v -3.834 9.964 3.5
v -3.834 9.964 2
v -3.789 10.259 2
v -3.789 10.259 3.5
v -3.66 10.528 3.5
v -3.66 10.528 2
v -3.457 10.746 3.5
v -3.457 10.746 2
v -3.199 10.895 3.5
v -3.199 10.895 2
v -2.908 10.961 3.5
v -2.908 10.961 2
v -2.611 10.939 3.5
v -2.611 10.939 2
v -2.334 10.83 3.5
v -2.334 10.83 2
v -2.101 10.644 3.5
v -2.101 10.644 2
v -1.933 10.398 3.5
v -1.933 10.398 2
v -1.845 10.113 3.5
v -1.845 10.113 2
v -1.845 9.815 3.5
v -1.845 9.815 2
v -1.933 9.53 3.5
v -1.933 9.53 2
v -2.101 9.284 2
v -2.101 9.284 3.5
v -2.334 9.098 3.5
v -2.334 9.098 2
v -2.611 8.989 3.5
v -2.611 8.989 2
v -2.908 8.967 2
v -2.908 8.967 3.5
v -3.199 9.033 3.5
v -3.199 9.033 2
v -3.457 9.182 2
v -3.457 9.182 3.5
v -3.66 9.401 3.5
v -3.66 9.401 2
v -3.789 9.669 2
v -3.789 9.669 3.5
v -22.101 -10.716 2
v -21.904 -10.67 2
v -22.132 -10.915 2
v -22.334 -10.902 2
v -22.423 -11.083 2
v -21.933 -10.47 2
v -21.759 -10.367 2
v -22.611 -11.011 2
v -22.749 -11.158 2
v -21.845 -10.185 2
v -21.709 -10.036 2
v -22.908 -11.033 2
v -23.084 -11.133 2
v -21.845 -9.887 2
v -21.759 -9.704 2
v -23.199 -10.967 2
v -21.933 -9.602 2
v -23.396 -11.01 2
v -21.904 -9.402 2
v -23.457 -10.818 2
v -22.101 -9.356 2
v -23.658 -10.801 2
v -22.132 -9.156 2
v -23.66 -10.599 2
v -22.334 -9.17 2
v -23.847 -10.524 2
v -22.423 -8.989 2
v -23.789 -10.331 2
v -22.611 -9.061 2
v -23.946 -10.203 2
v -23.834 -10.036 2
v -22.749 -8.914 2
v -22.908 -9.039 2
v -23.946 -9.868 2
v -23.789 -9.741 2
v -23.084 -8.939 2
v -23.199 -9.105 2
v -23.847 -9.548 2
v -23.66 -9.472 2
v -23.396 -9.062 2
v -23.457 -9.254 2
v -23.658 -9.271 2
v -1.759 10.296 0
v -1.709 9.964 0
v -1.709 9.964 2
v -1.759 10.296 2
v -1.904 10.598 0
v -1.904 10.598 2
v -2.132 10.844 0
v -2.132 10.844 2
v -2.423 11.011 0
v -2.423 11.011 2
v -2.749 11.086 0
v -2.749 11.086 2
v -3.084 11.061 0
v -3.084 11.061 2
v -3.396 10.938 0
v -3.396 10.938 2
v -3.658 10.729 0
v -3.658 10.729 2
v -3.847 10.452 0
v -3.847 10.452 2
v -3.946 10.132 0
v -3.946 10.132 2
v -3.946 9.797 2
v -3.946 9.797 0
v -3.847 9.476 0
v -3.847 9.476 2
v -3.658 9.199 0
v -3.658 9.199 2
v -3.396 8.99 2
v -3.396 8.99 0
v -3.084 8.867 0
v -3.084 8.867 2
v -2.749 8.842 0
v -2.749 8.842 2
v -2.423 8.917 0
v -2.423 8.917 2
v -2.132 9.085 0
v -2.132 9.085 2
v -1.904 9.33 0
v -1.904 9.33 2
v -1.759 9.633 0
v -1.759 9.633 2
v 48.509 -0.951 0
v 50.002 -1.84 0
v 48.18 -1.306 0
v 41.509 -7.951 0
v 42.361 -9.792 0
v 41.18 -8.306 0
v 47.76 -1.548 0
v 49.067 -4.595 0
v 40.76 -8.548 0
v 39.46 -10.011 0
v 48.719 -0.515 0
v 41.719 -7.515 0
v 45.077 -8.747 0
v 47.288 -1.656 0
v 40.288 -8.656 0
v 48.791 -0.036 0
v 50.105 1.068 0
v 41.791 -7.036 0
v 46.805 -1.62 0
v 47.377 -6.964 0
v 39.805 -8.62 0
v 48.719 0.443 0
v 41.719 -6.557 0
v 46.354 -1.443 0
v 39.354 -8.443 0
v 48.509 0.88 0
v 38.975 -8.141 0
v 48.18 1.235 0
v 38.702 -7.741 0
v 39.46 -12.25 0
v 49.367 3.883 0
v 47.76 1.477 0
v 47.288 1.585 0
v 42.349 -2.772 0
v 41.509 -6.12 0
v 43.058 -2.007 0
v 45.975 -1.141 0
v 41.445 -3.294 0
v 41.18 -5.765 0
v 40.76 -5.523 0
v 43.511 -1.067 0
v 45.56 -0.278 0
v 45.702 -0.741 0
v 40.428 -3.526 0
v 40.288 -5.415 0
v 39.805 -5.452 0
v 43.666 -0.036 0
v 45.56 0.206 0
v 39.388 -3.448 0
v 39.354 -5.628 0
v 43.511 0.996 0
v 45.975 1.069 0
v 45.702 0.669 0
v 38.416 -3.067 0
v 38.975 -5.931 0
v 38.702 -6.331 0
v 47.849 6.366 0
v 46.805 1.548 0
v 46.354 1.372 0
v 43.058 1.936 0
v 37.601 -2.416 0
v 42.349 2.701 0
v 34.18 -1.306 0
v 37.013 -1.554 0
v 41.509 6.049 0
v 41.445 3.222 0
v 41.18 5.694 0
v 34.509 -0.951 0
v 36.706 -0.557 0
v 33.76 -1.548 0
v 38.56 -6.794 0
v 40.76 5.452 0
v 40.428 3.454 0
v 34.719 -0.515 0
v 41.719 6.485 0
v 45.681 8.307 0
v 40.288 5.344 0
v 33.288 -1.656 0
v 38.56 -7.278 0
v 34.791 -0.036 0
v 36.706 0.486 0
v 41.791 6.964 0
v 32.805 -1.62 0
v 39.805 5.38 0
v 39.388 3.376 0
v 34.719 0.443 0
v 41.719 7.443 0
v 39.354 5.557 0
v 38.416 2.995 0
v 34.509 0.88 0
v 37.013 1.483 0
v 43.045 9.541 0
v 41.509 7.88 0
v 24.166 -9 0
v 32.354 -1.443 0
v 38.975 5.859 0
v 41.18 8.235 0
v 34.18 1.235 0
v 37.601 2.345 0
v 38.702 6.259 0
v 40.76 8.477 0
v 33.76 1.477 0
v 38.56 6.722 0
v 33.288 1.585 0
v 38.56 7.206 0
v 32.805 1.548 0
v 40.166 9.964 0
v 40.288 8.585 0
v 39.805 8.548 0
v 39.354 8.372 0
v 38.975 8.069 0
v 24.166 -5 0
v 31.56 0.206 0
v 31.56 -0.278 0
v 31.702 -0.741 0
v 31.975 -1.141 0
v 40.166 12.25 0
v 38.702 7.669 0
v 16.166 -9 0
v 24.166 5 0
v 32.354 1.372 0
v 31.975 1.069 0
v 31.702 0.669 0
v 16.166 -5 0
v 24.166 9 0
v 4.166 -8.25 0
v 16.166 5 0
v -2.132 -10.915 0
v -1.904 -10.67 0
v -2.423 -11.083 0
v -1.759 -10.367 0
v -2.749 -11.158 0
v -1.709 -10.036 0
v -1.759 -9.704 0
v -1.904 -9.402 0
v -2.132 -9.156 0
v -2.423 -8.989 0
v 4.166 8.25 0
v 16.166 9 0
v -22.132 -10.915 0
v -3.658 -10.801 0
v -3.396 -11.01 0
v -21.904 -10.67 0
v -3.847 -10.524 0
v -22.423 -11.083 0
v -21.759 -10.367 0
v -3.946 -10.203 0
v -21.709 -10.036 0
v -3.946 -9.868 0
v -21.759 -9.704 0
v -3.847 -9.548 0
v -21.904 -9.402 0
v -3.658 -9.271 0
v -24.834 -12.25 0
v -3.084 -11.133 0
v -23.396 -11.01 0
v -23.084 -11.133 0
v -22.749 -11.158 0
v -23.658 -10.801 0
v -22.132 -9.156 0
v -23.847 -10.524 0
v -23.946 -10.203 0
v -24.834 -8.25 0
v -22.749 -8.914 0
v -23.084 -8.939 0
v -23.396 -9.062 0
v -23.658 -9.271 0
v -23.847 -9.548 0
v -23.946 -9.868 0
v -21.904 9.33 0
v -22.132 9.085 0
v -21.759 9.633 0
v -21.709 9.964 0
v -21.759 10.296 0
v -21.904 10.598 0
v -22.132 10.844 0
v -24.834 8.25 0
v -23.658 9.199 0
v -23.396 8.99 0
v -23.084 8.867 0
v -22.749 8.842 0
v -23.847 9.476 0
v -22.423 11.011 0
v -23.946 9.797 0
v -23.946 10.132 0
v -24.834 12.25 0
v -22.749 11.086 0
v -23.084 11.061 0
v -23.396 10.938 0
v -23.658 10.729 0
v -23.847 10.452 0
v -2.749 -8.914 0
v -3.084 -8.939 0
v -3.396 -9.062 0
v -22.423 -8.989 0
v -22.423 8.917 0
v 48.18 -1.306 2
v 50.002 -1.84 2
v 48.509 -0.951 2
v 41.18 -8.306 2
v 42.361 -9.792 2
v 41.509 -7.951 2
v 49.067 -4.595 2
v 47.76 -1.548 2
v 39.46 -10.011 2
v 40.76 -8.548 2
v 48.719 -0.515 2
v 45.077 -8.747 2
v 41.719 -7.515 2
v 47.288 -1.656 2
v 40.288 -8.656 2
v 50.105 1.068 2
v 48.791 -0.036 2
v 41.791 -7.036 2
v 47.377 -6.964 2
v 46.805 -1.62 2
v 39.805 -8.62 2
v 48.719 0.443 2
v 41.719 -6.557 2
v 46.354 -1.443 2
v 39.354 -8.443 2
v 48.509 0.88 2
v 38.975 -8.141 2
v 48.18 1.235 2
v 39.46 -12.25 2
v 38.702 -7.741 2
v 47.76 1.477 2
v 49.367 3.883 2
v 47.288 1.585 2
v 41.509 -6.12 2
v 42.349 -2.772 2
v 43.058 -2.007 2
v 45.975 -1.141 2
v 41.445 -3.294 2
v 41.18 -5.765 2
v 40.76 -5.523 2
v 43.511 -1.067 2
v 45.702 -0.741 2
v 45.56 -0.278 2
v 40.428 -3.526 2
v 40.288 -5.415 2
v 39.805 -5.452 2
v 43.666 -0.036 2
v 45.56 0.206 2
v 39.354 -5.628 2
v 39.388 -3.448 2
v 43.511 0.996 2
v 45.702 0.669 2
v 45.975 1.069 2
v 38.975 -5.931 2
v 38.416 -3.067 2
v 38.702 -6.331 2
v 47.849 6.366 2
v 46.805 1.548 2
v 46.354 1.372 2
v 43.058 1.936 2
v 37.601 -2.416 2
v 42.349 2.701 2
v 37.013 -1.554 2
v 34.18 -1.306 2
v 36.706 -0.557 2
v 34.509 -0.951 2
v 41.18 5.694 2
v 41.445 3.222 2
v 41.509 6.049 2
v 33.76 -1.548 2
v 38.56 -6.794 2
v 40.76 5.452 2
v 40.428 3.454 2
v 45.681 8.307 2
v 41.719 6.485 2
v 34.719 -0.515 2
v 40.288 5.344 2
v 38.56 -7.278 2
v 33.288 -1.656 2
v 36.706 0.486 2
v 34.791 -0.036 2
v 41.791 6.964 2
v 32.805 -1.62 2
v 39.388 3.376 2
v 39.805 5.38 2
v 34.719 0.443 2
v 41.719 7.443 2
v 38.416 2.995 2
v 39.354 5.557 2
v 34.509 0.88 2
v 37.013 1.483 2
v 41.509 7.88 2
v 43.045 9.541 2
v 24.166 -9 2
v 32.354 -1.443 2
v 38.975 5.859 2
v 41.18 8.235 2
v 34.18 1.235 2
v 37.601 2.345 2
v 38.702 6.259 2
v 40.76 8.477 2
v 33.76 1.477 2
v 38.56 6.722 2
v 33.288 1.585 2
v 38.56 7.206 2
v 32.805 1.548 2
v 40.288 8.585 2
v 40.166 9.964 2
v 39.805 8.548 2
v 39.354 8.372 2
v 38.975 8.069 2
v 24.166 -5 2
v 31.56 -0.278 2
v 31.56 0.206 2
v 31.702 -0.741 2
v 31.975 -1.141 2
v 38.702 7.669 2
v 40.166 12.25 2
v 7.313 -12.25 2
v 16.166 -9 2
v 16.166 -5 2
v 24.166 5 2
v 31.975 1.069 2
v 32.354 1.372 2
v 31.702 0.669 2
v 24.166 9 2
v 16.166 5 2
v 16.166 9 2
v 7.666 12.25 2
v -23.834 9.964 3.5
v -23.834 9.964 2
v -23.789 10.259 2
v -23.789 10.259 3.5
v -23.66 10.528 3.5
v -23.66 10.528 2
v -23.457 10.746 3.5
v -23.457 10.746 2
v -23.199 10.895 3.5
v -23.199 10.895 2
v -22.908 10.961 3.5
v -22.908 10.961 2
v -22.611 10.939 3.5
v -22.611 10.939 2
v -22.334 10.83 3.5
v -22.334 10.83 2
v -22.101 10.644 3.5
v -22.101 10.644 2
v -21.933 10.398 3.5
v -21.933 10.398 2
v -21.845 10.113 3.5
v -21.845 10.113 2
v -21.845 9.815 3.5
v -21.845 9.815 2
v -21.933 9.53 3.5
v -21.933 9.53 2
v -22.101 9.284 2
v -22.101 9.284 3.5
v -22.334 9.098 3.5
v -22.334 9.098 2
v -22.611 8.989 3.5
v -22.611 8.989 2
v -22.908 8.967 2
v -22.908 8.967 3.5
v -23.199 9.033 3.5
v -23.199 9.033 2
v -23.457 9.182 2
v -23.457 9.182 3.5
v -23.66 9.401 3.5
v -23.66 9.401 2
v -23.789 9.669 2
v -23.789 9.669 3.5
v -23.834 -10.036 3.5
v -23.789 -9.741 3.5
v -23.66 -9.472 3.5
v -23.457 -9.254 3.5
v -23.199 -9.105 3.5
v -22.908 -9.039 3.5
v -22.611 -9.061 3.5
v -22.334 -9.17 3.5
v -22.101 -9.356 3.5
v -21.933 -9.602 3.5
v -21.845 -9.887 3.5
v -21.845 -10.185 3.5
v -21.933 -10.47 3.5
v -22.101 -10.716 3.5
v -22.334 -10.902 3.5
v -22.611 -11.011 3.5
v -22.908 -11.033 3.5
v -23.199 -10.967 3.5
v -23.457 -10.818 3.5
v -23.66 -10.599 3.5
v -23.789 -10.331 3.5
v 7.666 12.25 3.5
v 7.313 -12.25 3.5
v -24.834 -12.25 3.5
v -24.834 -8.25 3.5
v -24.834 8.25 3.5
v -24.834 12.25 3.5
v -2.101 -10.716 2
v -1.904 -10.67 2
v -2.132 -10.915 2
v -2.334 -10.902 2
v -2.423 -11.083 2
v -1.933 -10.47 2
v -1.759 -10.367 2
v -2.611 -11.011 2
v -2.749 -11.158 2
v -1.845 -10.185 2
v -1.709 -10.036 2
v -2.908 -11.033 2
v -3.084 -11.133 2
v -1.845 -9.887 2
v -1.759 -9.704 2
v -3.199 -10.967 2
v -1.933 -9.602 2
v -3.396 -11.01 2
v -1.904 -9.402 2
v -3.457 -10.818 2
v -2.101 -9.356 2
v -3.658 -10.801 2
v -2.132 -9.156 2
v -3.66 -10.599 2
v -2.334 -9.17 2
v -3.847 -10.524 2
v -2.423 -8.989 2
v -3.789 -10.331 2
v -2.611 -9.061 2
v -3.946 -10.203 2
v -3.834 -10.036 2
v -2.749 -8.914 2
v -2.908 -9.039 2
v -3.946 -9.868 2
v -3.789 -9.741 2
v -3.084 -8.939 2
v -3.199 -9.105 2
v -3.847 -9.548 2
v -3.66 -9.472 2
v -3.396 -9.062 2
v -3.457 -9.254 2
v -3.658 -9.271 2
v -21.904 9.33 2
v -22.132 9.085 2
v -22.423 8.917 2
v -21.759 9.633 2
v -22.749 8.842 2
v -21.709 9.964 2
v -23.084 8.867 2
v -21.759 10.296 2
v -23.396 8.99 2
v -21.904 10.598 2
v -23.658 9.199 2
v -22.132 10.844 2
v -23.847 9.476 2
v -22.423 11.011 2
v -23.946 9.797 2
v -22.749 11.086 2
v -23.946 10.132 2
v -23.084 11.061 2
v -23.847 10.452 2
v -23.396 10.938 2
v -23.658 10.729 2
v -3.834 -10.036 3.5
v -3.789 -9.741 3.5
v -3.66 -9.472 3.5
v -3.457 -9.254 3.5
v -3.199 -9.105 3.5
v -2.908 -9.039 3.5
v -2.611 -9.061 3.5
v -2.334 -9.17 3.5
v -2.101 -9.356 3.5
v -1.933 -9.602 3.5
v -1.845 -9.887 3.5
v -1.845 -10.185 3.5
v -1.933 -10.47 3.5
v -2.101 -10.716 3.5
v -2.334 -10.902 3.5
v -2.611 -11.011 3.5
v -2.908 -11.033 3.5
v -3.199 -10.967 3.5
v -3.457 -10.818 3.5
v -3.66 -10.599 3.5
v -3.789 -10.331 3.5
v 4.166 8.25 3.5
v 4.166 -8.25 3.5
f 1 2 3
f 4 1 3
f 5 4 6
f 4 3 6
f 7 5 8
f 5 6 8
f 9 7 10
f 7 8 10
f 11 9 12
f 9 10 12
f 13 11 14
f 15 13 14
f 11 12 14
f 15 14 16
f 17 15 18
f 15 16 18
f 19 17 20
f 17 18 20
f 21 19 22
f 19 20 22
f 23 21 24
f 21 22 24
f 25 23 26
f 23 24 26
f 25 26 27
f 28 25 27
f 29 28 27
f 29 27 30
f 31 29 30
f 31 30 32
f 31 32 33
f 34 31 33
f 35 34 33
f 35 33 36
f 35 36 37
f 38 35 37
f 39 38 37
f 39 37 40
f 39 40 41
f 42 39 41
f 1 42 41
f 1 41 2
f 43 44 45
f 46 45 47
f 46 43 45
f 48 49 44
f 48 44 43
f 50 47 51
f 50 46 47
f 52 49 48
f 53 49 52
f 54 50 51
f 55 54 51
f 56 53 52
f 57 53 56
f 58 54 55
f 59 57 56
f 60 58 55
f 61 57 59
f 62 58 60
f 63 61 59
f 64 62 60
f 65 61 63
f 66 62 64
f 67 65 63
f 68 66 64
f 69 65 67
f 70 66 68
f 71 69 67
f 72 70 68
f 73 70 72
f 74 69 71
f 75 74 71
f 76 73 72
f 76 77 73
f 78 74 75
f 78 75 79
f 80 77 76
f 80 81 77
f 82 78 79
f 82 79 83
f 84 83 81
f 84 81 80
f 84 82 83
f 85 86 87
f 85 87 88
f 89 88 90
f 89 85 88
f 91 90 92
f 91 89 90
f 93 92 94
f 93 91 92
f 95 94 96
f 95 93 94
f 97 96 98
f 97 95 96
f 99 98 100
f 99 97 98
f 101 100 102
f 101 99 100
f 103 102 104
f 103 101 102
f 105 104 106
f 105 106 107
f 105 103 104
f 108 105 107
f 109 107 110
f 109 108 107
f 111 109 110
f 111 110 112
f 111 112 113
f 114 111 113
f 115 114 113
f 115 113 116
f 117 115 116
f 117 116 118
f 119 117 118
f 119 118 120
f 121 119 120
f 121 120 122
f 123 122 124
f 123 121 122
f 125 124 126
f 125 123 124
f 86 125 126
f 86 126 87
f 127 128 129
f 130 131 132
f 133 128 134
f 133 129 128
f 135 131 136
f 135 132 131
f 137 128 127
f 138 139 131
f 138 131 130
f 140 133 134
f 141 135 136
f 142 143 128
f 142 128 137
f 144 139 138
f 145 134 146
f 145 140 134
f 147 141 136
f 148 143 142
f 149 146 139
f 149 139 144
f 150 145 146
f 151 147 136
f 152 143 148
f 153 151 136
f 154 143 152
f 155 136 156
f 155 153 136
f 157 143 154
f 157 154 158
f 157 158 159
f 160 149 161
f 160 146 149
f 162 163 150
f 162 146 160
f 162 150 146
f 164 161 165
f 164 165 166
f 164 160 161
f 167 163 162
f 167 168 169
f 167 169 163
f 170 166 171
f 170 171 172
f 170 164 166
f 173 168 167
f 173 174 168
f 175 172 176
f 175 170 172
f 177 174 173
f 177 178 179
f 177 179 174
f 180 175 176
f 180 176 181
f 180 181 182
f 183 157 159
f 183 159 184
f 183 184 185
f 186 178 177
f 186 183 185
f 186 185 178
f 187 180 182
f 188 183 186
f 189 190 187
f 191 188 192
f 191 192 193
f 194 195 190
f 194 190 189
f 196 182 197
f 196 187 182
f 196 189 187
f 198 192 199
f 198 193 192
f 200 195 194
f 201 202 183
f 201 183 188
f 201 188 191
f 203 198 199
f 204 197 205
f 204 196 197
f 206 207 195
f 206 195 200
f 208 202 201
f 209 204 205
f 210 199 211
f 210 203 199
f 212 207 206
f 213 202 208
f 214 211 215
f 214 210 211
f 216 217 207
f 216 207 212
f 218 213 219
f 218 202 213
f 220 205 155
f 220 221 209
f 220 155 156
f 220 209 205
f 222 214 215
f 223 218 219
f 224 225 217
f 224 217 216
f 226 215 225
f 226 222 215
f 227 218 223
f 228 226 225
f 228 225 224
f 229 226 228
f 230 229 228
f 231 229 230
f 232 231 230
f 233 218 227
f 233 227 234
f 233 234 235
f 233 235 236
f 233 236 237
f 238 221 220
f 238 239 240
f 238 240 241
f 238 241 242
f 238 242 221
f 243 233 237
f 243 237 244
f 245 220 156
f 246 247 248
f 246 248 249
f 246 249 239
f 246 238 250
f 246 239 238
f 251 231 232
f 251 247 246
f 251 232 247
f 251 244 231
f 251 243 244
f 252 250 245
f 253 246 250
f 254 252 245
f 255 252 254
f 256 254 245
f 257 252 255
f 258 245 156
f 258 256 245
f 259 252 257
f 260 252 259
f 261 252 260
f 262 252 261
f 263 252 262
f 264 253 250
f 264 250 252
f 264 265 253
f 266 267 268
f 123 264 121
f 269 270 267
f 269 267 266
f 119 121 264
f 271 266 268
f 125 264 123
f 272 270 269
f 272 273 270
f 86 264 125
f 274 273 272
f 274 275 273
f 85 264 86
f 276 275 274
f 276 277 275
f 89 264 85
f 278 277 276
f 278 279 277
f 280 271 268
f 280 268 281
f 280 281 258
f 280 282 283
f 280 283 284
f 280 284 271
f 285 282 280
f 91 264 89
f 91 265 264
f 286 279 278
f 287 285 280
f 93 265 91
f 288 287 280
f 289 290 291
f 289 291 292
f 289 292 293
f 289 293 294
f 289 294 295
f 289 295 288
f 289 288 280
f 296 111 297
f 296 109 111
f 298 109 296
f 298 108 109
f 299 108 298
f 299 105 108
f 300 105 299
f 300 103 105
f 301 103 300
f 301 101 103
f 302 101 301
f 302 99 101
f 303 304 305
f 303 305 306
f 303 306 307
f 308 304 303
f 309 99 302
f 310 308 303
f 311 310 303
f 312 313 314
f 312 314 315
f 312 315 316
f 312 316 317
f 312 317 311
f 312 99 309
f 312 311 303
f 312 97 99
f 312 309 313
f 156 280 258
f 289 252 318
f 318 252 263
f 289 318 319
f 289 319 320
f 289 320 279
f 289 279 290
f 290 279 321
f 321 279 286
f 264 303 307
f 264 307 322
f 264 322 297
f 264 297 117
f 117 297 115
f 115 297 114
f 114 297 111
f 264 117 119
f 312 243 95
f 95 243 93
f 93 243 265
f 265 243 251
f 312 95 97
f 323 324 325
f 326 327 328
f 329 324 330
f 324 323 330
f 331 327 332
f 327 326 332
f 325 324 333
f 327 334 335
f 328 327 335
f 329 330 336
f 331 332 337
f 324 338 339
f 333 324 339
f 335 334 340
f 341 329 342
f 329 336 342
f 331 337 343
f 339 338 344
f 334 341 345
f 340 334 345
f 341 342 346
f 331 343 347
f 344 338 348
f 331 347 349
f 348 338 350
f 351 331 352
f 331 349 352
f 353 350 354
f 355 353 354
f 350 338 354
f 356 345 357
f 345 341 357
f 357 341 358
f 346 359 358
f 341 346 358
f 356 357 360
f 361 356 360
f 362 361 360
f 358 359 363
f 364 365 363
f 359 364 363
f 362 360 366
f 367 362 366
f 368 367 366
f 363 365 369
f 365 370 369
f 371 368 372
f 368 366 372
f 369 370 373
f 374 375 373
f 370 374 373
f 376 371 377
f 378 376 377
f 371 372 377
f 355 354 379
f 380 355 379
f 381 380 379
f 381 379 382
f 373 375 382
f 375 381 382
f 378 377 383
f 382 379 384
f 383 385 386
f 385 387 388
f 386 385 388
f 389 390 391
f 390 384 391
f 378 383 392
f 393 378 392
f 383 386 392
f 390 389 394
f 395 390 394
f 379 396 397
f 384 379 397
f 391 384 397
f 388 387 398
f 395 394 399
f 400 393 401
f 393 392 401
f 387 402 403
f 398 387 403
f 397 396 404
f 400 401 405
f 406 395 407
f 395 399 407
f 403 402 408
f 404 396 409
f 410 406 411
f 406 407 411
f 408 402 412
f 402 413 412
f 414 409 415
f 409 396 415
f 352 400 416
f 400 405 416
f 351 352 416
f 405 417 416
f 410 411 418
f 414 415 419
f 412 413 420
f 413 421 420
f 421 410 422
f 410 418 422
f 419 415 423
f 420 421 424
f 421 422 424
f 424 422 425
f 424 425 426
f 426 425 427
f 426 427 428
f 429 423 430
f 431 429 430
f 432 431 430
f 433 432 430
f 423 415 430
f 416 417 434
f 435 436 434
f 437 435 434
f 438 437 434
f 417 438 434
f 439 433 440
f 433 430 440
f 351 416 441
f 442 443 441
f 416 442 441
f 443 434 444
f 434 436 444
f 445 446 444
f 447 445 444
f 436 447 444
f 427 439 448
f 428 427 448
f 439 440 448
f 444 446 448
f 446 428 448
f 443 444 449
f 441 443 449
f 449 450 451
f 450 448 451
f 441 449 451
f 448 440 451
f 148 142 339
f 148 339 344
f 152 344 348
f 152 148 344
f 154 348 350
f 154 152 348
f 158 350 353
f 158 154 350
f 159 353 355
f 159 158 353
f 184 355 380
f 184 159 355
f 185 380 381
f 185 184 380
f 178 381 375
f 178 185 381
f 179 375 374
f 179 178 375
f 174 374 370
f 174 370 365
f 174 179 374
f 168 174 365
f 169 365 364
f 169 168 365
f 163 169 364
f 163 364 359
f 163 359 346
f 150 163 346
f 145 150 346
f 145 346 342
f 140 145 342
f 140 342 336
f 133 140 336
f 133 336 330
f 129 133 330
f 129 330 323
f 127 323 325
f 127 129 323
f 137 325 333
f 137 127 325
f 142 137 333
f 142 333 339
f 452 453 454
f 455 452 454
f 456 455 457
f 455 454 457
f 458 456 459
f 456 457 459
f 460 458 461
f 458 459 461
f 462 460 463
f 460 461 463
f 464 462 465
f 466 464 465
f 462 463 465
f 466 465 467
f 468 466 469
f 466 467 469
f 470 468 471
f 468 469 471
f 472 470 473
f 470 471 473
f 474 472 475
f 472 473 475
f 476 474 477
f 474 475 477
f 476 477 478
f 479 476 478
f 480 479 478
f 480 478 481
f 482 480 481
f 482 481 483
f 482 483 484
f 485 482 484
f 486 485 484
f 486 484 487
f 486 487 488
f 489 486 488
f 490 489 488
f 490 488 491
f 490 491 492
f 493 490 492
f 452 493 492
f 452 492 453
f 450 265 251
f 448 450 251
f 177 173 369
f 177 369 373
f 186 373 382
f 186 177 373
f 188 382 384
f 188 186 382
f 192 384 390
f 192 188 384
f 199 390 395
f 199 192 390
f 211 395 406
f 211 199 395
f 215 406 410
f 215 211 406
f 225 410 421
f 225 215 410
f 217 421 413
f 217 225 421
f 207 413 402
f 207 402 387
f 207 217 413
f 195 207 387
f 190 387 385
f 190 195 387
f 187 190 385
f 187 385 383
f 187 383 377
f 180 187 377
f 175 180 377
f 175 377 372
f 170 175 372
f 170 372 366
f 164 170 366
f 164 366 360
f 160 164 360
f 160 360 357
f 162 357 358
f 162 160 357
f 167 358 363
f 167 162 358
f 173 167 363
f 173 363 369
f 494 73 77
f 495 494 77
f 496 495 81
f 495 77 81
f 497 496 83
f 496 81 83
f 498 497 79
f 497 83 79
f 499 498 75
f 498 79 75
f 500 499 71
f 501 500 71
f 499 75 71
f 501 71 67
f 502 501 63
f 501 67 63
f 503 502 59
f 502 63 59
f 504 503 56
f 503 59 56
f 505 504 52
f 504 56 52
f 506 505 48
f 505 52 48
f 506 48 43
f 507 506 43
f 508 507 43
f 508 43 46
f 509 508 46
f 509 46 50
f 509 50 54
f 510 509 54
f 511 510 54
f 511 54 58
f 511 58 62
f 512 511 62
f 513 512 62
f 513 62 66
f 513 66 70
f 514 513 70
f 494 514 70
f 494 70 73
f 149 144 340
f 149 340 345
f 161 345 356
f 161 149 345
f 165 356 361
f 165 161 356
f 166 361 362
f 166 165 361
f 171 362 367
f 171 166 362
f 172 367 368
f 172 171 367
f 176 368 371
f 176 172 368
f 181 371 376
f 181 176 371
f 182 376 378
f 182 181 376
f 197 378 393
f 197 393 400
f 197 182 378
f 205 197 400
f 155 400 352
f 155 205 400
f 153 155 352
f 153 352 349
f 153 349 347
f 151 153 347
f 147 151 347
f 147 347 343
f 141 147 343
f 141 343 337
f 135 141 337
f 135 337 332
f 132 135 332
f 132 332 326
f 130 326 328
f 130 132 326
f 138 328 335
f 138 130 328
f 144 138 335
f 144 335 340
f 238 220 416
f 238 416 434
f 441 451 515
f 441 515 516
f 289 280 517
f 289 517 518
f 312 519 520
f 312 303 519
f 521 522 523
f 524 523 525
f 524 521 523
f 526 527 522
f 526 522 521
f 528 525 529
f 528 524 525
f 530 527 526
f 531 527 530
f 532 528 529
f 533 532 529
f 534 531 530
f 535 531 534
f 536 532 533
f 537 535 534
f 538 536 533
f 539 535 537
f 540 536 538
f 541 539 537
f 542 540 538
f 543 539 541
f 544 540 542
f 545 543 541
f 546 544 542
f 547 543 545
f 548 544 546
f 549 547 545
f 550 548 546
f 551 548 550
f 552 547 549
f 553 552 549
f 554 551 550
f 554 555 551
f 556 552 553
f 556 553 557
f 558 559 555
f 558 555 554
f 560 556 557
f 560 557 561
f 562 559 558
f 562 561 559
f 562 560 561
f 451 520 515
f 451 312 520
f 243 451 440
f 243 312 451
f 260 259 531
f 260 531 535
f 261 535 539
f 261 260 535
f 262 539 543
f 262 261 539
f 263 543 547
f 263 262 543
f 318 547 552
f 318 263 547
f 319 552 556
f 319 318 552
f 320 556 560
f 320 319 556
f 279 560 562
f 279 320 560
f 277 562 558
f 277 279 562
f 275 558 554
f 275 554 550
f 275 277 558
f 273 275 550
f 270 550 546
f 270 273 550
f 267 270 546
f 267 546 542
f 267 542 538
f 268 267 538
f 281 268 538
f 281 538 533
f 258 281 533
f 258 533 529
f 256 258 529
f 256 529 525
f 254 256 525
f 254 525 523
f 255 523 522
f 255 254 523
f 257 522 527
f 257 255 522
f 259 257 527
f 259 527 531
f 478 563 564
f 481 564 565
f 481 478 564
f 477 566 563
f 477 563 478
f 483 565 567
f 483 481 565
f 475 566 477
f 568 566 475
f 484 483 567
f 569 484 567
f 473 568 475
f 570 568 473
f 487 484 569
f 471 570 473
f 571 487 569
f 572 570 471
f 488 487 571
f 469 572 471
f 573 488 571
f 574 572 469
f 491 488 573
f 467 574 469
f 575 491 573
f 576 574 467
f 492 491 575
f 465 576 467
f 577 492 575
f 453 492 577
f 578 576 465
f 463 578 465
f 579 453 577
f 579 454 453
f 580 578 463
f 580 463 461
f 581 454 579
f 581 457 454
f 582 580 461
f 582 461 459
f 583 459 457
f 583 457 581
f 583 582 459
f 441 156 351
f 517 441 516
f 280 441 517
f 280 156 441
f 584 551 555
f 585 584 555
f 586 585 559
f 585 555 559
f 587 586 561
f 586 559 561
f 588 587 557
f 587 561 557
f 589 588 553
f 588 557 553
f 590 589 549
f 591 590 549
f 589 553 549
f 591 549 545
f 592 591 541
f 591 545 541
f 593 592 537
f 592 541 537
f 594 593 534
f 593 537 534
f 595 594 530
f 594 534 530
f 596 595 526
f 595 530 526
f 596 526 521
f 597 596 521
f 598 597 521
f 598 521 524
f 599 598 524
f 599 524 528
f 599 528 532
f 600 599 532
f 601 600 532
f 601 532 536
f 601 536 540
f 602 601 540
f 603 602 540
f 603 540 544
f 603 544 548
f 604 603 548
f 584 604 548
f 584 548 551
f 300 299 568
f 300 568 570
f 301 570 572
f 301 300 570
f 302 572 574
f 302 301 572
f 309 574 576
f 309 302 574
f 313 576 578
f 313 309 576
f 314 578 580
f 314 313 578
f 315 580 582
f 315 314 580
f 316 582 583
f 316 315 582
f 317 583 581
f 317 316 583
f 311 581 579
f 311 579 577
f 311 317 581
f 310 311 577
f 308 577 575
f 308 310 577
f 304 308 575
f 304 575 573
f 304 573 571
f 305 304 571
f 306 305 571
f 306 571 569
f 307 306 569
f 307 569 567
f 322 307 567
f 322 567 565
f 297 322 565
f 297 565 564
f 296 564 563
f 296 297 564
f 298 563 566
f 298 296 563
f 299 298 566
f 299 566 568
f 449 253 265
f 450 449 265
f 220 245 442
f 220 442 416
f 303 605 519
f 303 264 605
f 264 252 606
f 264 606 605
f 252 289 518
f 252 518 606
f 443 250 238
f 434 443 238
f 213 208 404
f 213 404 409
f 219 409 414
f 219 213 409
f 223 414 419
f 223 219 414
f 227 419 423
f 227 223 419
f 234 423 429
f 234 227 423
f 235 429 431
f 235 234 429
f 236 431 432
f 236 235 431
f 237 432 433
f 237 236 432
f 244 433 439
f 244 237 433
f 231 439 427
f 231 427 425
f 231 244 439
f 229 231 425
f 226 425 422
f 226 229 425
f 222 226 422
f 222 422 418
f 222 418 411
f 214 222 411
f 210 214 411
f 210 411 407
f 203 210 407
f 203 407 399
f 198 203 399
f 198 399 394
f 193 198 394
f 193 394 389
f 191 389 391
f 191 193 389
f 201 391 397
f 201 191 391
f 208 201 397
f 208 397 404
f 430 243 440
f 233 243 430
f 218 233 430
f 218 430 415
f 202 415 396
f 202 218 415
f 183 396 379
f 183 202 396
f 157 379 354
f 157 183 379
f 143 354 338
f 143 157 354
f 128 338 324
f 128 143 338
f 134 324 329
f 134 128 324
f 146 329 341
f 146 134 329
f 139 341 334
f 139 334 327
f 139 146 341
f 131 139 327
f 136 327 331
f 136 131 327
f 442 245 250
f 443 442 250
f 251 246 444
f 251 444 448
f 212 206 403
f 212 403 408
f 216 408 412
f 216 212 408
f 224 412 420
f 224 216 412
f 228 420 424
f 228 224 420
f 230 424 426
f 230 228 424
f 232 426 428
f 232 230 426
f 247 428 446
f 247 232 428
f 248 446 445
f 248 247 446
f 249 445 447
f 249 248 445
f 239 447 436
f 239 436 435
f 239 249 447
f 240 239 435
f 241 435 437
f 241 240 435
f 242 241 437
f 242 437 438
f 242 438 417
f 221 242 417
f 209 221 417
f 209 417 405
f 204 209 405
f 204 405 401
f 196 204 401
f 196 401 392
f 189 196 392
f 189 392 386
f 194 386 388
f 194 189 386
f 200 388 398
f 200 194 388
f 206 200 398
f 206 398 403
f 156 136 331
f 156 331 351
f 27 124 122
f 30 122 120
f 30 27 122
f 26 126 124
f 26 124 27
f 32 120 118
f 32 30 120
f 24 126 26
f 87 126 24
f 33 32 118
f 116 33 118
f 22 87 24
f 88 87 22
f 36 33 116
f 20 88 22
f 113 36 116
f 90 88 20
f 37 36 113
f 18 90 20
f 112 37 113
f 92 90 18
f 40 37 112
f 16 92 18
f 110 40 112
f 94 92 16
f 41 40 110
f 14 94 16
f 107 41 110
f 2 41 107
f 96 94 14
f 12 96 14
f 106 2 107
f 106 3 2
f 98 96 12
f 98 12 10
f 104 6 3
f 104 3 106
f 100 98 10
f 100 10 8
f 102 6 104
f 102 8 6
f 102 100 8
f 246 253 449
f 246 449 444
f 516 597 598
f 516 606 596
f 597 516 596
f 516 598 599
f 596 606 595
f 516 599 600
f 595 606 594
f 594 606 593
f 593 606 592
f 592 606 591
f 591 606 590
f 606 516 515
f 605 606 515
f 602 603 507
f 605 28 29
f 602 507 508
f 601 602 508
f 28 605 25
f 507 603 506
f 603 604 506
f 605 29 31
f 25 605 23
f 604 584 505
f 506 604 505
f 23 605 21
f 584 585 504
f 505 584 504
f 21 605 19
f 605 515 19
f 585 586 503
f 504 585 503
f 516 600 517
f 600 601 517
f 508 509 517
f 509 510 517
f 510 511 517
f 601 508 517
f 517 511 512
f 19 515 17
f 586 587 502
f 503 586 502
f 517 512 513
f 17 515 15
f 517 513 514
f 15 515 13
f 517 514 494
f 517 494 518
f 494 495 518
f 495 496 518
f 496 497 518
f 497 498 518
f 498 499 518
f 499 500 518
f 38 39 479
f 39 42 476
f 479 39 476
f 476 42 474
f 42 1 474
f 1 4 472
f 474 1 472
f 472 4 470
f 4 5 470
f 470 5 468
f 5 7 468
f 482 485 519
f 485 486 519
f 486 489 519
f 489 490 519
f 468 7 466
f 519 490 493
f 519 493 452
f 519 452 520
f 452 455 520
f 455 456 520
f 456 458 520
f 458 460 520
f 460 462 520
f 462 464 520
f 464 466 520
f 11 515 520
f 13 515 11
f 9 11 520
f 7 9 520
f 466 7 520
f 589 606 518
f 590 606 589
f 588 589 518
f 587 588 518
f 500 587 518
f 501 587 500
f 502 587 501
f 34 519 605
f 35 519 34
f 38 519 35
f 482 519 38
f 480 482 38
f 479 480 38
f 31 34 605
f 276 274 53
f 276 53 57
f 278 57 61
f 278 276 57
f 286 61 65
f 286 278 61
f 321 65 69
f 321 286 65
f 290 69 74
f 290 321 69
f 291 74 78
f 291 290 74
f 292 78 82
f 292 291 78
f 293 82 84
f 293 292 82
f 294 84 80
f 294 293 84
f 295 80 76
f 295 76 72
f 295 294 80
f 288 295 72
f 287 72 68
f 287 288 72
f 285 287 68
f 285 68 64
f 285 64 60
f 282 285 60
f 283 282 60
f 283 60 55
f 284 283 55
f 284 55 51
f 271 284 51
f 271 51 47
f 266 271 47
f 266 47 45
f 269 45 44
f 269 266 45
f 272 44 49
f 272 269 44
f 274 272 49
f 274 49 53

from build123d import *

# Parameters (mm, degrees)
SKETCH1_R           = 1.625
SKETCH1_R_2         = 3.5
SKETCH1_R_3         = 1.125
SKETCH1_W           = 8
SKETCH1_H           = 4
BOSS_EXTRUDE1_DEPTH = 2
BOSS_EXTRUDE2_DEPTH = 1.5
SKETCH4_R           = 1
CUT_EXTRUDE1_DEPTH  = 52.758903682


with BuildPart() as part:
    # Sketch1 → Boss-Extrude1 (new body)
    with BuildSketch(Plane.XY):
        with BuildLine():
            Line((-4.833560916, 12.25), (5.166439084, 12.25))
            Line((5.166439084, 12.25), (40.166439084, 12.25))
            Line((40.166439084, 12.25), (40.166439084, 9.964216866))
            ThreePointArc((40.166439084, 9.964216866), (50.16018383, -0.389429797), (39.459588189, -10.010769942))
            Line((39.459588189, -10.010769942), (39.459588189, -12.25))
            Line((39.459588189, -12.25), (5.166439084, -12.25))
            Line((5.166439084, -12.25), (-4.833560916, -12.25))
            Line((-4.833560916, -12.25), (-24.833560916, -12.25))
            Line((-24.833560916, -12.25), (-24.833560916, -8.25))
            Line((-24.833560916, -8.25), (4.166439084, -8.25))
            Line((4.166439084, -8.25), (4.166439084, 8.25))
            Line((4.166439084, 8.25), (-24.833560916, 8.25))
            Line((-24.833560916, 8.25), (-24.833560916, 12.25))
            Line((-24.833560916, 12.25), (-4.833560916, 12.25))
        make_face()
        with Locations((40.166439084, 6.964216866)):
            Circle(SKETCH1_R, mode=Mode.SUBTRACT)
        with Locations((47.166439084, -0.035783134)):
            Circle(SKETCH1_R, mode=Mode.SUBTRACT)
        with Locations((40.166439084, -7.035783134)):
            Circle(SKETCH1_R, mode=Mode.SUBTRACT)
        with Locations((33.166439084, -0.035783134)):
            Circle(SKETCH1_R, mode=Mode.SUBTRACT)
        with Locations((40.166439084, -0.035783134)):
            Circle(SKETCH1_R_2, mode=Mode.SUBTRACT)
        with Locations((-2.833560916, 9.964216866)):
            Circle(SKETCH1_R_3, mode=Mode.SUBTRACT)
        with Locations((-2.833560916, -10.035783134)):
            Circle(SKETCH1_R_3, mode=Mode.SUBTRACT)
        with Locations((-22.833560916, 9.964216866)):
            Circle(SKETCH1_R_3, mode=Mode.SUBTRACT)
        with Locations((-22.833560916, -10.035783134)):
            Circle(SKETCH1_R_3, mode=Mode.SUBTRACT)
        with Locations((20.166471095, 7)):
            Rectangle(SKETCH1_W, SKETCH1_H, mode=Mode.SUBTRACT)
        with Locations((20.166471095, -7)):
            Rectangle(SKETCH1_W, SKETCH1_H, mode=Mode.SUBTRACT)
    extrude(amount=BOSS_EXTRUDE1_DEPTH)

    # Sketch2 → Boss-Extrude2 (add)
    with BuildSketch(Plane.XY.offset(2)):
        Polygon((-24.833560916, 12.25), (7.666439084, 12.25), (7.313013637, -12.25), (-24.833560916, -12.25), (-24.833560916, -8.25), (4.166439084, -8.25), (4.166439084, 8.25), (-24.833560916, 8.25), align=None)
    extrude(amount=BOSS_EXTRUDE2_DEPTH)

    # Sketch4 → Cut-Extrude1 (cut, through all)
    with BuildSketch(Plane(origin=(0, 0, 0), x_dir=(-1, 0, 0), z_dir=(0, 0, -1))):
        with Locations((2.833560916, 9.964216866)):
            Circle(SKETCH4_R)
        with Locations((2.833560916, -10.035783134)):
            Circle(SKETCH4_R)
        with Locations((22.833560916, -10.035783134)):
            Circle(SKETCH4_R)
        with Locations((22.833560916, 9.964216866)):
            Circle(SKETCH4_R)
    extrude(amount=-CUT_EXTRUDE1_DEPTH, mode=Mode.SUBTRACT)


solid = part.part
